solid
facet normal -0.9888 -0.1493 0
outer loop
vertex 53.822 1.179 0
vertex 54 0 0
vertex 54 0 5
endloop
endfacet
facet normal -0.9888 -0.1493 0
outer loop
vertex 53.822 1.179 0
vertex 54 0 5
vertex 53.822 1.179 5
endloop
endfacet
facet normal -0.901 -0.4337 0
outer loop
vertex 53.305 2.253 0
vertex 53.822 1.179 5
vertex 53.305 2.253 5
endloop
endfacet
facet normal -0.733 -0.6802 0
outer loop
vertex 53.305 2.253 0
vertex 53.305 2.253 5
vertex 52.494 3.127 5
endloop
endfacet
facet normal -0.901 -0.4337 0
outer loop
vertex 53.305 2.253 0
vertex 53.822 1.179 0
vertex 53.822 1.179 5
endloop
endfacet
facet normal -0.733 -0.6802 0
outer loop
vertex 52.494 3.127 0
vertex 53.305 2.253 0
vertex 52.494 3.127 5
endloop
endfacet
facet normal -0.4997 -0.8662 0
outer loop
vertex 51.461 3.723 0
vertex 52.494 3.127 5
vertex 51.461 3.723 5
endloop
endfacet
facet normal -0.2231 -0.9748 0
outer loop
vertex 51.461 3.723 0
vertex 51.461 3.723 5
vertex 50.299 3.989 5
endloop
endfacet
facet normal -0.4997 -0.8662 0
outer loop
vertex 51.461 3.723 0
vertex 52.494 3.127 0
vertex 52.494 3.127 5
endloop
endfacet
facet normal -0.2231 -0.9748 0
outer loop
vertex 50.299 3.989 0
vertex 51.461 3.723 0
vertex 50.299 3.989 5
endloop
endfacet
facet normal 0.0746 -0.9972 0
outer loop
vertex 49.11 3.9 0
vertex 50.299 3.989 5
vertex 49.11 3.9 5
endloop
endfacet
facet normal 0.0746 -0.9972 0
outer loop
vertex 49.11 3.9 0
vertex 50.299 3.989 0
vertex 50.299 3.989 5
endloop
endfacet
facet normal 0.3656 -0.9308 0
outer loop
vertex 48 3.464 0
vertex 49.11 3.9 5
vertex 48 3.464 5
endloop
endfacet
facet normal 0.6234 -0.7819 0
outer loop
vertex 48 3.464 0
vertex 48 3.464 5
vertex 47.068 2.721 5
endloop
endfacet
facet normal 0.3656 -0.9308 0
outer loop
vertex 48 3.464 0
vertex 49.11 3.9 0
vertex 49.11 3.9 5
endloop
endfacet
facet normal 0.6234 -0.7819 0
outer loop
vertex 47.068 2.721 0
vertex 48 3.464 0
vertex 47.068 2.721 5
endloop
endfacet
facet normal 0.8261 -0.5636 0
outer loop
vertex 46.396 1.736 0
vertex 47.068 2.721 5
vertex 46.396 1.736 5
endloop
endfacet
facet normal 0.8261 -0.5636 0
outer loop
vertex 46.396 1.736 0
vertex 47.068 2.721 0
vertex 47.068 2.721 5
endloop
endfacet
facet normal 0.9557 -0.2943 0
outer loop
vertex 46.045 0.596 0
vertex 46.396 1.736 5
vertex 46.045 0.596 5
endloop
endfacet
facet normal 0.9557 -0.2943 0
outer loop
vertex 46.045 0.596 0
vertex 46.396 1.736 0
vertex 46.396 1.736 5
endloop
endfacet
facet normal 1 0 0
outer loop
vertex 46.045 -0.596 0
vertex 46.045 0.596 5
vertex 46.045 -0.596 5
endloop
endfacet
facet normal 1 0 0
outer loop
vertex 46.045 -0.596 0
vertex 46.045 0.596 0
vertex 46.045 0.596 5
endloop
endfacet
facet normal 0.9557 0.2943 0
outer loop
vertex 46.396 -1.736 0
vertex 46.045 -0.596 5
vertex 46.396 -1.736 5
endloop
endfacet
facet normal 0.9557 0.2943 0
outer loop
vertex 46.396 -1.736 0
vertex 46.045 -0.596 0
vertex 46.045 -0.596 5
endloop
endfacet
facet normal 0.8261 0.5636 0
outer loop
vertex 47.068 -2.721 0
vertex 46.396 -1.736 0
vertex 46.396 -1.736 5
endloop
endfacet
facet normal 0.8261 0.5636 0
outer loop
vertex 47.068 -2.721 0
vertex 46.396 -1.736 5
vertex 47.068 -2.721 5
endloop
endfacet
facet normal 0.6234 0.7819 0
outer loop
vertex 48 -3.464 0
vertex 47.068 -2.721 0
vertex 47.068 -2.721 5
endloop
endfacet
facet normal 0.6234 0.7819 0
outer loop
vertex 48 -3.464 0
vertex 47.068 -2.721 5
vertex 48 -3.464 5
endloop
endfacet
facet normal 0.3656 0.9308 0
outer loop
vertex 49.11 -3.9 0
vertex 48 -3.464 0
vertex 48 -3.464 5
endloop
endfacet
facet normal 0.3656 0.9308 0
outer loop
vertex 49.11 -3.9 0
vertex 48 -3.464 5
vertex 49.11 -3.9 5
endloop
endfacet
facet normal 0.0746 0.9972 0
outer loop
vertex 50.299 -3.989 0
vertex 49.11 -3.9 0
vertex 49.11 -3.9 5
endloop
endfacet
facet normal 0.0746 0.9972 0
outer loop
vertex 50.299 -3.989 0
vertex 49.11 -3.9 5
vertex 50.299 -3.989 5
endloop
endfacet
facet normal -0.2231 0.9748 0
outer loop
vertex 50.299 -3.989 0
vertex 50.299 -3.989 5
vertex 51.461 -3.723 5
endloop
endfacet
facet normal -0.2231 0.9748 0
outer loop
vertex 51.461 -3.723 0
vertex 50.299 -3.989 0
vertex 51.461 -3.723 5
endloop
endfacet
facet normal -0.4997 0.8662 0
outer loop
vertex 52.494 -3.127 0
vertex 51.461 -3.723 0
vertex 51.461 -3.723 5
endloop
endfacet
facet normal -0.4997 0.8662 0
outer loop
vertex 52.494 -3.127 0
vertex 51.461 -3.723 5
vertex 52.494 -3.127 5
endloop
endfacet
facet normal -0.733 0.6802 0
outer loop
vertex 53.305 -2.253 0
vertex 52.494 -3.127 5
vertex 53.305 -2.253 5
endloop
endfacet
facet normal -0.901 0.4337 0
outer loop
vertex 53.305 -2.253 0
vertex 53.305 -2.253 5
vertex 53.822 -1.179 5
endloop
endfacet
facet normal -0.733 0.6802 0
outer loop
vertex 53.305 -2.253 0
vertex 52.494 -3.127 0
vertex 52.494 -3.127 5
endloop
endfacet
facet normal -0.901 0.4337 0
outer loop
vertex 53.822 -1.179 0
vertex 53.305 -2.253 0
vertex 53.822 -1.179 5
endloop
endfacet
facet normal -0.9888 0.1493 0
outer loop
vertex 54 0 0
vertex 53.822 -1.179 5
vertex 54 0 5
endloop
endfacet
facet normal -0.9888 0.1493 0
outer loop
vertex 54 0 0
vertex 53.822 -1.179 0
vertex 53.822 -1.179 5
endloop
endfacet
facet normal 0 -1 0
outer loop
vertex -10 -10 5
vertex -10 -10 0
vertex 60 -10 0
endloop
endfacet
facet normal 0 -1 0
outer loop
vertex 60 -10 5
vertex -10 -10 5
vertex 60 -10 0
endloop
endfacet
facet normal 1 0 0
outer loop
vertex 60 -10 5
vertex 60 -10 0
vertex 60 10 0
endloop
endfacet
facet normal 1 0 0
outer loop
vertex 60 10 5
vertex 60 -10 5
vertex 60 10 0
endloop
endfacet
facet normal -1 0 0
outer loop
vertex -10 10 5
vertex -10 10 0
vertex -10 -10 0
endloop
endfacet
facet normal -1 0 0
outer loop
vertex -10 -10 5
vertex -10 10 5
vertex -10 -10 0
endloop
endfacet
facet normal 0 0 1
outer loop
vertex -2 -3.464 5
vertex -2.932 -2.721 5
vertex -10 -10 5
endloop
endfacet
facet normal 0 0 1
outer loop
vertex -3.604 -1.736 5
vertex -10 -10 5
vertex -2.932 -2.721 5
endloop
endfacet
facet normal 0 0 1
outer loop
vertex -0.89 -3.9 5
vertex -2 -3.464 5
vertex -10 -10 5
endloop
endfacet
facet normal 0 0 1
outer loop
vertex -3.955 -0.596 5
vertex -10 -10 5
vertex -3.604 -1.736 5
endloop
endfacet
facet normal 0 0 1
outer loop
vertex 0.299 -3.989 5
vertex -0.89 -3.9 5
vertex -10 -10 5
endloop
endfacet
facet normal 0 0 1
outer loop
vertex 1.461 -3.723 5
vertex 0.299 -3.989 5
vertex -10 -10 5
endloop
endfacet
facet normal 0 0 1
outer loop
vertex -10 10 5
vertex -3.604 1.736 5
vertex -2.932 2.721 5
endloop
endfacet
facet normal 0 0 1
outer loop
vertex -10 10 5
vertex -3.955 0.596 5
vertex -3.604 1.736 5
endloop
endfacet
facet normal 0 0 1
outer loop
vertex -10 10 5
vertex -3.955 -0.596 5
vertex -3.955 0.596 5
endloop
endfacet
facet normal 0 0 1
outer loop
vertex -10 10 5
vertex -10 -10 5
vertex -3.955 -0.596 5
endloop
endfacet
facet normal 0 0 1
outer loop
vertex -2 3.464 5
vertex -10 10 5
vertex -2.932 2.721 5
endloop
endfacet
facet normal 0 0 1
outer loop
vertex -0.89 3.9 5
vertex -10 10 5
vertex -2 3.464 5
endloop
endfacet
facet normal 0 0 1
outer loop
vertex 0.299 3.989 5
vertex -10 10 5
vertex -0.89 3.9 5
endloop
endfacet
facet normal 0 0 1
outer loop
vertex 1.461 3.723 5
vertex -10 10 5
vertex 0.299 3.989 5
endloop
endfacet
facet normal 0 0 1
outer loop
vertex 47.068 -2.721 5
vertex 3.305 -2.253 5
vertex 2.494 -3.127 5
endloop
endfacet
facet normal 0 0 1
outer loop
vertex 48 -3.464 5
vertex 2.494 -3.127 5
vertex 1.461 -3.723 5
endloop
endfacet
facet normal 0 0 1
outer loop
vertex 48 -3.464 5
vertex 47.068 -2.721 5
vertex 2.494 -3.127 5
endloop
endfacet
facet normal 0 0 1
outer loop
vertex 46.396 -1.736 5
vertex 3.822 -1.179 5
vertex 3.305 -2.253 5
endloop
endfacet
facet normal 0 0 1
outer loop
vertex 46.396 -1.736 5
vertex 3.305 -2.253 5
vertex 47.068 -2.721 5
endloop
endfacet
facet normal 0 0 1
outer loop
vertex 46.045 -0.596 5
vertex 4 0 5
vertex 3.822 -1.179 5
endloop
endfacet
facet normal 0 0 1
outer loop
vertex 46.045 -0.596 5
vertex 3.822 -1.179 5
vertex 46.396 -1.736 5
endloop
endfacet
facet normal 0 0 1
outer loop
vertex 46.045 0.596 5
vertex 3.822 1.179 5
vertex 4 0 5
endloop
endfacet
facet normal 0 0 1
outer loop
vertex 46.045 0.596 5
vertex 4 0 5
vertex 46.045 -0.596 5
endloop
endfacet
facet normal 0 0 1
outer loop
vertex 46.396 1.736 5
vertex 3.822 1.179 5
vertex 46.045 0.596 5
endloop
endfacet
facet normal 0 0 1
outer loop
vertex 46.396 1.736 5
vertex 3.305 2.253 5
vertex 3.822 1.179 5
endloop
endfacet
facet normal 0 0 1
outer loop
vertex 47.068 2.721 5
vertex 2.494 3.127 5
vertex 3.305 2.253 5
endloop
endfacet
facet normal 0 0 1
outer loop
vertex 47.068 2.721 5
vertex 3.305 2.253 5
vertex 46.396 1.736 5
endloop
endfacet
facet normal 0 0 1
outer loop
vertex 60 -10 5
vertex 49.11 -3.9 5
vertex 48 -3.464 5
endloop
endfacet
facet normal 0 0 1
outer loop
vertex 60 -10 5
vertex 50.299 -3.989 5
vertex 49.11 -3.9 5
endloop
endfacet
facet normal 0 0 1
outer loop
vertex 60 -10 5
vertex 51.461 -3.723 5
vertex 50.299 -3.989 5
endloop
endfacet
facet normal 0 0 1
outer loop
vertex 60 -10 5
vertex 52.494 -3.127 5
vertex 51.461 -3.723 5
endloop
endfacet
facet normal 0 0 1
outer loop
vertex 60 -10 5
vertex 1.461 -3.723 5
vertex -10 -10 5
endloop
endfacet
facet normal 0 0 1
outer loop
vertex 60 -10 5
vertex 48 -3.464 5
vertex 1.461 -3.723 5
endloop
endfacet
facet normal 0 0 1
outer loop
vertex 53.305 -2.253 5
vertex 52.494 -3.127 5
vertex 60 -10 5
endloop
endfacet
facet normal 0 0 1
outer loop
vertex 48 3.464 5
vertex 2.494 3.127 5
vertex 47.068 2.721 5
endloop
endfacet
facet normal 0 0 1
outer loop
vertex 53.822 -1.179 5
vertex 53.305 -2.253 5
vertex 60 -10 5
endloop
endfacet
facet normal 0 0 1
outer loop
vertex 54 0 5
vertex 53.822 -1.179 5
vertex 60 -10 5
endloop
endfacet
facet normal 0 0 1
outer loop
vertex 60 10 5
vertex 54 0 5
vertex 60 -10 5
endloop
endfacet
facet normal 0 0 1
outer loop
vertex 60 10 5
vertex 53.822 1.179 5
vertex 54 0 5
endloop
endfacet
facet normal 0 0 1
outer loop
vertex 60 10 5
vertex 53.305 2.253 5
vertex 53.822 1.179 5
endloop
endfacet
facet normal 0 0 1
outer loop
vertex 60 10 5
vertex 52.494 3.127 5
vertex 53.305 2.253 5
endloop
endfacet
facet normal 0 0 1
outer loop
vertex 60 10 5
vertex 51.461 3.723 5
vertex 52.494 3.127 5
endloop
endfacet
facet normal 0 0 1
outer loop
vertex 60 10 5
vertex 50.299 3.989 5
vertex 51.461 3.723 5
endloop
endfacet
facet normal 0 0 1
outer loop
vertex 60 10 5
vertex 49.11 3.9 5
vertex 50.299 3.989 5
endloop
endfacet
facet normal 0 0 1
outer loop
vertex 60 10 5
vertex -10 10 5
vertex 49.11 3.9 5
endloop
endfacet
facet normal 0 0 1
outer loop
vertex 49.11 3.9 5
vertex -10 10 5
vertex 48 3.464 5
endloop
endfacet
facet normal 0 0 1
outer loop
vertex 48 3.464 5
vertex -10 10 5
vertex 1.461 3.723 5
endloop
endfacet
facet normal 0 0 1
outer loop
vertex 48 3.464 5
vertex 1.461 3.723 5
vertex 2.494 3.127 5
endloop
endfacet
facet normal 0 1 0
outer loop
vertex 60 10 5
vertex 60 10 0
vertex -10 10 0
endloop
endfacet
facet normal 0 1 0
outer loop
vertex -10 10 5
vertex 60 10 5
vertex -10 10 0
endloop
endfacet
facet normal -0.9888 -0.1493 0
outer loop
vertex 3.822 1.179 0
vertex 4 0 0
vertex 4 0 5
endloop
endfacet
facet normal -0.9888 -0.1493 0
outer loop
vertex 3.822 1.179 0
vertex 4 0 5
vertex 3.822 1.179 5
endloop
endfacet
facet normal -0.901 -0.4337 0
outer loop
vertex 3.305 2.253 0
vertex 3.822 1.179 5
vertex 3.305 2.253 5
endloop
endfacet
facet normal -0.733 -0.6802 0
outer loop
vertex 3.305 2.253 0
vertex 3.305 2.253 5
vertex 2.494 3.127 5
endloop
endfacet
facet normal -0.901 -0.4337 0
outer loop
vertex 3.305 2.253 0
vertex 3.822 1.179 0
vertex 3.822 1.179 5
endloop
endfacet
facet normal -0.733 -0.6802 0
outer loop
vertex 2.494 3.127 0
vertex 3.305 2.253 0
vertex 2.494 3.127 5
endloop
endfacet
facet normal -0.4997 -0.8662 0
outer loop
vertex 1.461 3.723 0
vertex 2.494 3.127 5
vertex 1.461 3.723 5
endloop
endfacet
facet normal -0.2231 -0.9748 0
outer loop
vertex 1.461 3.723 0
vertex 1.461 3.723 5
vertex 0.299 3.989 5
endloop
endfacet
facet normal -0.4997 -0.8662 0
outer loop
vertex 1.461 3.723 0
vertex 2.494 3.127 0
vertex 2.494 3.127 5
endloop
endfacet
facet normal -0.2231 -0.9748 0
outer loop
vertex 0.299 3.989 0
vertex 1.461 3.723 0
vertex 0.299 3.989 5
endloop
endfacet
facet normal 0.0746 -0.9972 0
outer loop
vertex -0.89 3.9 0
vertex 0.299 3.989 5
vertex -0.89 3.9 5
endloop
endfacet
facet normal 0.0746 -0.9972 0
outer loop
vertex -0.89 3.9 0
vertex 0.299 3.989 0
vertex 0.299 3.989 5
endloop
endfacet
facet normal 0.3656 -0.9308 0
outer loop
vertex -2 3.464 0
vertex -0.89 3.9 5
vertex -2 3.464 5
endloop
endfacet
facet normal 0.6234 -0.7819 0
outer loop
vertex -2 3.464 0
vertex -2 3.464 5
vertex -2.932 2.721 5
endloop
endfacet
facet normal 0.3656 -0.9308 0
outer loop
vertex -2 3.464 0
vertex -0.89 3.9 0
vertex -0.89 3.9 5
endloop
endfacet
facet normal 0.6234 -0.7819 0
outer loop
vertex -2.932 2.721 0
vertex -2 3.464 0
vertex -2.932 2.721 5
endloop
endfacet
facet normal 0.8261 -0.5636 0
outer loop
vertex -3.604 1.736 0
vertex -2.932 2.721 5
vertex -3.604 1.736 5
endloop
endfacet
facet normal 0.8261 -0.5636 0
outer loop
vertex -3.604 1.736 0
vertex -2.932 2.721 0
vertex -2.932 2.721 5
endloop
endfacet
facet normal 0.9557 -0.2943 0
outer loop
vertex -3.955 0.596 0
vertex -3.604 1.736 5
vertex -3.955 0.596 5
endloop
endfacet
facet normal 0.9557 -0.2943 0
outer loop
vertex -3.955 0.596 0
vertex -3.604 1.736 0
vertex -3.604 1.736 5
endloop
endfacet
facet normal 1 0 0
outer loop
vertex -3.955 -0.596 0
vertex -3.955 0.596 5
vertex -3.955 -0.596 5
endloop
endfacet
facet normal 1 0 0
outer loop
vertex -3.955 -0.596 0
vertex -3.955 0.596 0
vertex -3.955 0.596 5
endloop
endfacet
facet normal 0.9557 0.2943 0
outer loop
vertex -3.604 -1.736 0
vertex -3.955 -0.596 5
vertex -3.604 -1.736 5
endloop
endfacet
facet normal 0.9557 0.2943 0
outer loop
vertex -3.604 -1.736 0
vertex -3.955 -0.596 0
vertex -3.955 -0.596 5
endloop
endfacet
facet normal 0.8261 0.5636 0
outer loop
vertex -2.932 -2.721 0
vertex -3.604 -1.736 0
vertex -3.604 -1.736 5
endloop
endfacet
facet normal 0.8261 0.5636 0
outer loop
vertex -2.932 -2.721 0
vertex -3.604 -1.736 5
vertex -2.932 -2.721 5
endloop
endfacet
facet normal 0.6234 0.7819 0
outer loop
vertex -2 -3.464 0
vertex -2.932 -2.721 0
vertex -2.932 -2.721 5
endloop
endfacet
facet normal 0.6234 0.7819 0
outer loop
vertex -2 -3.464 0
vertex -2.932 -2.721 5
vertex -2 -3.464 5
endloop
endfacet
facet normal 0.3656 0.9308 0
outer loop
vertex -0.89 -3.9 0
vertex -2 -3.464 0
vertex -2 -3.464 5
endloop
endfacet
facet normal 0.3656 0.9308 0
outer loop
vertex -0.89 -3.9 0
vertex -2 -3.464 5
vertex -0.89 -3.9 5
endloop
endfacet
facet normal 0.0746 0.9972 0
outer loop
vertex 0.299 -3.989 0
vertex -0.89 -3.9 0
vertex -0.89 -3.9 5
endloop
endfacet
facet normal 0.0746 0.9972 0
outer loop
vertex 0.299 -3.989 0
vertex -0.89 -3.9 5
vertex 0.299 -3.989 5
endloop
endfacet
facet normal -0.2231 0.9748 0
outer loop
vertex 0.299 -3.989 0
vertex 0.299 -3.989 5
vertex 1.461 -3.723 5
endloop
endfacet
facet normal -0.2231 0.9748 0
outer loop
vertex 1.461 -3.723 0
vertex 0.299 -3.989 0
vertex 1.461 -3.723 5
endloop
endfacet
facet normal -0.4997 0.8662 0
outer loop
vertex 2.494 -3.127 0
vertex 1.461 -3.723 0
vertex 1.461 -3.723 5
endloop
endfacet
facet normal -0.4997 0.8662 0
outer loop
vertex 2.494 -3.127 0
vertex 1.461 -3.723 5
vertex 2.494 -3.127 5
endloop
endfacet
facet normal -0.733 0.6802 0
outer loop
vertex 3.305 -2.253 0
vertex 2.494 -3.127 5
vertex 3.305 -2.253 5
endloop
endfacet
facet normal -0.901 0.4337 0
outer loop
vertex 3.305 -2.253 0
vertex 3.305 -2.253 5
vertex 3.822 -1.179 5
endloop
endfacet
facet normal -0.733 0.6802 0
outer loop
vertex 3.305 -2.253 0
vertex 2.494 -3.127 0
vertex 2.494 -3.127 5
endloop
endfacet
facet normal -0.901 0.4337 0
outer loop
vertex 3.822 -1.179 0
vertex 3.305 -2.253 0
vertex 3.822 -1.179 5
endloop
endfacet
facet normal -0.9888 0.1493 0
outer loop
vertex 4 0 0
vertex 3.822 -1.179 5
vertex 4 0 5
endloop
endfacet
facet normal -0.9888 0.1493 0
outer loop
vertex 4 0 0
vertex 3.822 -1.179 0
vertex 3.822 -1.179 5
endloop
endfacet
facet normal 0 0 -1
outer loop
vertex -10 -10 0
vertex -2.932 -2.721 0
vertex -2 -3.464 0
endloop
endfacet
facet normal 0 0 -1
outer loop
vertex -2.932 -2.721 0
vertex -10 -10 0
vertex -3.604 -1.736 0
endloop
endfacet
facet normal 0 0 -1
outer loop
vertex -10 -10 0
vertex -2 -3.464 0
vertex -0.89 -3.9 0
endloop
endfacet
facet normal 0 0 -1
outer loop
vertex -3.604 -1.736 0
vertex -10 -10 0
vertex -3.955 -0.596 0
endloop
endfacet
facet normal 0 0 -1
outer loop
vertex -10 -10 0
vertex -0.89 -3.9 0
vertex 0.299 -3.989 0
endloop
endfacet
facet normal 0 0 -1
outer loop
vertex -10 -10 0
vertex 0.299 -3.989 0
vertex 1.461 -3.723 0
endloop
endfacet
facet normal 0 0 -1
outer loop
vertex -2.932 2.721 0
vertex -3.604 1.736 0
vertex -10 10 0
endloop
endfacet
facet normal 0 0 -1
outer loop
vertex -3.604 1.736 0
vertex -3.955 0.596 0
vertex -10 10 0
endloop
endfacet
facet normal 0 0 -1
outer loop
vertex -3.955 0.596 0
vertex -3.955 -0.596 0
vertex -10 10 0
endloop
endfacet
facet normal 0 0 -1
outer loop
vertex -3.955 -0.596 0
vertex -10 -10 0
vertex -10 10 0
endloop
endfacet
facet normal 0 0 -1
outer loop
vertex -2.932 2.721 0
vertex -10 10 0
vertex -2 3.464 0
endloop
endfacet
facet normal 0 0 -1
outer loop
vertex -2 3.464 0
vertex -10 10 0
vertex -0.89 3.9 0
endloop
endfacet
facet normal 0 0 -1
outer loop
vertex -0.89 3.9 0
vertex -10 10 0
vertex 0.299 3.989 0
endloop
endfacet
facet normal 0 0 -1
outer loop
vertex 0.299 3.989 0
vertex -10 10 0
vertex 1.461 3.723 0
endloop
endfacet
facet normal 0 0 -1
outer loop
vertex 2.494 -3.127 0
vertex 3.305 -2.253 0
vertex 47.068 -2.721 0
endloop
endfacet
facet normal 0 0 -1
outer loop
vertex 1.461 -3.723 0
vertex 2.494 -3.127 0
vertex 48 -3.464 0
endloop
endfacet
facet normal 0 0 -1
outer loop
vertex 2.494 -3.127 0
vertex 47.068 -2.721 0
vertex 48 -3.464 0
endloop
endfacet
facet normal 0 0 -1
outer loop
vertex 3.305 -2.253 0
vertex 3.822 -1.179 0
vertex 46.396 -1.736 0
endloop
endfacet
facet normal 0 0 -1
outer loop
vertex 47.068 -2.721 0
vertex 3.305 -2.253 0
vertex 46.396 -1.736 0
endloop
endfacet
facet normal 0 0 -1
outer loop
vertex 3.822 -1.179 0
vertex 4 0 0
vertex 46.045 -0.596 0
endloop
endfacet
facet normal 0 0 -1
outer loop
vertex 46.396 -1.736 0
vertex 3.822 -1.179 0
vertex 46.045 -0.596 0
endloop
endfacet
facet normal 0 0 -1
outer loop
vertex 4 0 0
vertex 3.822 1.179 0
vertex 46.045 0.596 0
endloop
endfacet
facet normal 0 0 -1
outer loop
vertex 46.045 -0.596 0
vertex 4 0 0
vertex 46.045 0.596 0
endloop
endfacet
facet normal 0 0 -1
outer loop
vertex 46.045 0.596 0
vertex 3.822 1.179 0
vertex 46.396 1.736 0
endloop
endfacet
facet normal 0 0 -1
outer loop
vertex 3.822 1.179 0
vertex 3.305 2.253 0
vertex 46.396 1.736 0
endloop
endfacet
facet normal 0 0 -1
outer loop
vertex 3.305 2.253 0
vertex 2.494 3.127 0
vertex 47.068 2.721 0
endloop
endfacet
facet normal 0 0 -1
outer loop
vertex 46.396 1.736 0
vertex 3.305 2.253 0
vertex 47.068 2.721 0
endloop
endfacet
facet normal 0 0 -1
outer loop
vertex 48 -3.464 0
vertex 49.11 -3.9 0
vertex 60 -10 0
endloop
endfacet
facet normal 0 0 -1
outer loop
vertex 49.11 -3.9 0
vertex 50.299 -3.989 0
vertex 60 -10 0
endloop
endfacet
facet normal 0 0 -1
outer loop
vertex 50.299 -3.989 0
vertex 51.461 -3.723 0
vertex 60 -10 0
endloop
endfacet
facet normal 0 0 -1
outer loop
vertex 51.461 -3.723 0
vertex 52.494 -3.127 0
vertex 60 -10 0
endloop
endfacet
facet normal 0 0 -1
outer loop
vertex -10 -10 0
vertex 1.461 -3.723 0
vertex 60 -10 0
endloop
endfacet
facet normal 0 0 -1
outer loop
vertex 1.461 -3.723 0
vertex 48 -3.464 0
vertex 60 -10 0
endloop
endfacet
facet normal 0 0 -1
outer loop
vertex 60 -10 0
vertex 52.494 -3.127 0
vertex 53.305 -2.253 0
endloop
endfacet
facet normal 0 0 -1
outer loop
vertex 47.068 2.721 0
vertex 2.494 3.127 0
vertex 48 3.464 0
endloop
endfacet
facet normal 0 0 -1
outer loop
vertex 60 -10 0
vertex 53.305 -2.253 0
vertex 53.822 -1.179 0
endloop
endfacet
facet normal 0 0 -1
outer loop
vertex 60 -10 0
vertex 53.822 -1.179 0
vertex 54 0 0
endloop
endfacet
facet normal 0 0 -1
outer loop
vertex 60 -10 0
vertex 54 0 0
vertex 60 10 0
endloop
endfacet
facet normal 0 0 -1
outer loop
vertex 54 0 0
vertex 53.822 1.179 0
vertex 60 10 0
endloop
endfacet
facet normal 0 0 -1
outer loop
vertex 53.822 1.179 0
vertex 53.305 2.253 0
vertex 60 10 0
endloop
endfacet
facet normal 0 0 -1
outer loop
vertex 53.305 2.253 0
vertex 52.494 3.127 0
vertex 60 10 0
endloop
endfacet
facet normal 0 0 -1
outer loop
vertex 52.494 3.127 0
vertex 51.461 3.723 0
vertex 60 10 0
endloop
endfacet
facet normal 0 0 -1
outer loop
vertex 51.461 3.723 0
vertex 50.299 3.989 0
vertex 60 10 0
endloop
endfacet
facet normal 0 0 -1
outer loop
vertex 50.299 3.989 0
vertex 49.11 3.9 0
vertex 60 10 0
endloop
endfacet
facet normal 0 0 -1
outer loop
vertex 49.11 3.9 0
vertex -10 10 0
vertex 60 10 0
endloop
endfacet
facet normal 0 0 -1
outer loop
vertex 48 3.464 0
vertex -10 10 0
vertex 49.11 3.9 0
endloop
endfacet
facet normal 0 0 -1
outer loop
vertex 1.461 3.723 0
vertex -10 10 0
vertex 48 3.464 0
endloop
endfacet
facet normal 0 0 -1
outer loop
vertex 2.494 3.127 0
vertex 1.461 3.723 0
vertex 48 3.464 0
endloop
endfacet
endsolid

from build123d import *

# Parameters (mm, degrees)
SKETCH_1_R      = 4
EXTRUDE_1_DEPTH = 5


with BuildPart() as part:
    # 草图1 → 凸台-拉伸1 (new body)
    with BuildSketch(Plane.XY):
        Polygon((10, -10), (40, -10), (60, -10), (60, 10), (40, 10), (10, 10), (-10, 10), (-10, -10), align=None)
        Circle(SKETCH_1_R, mode=Mode.SUBTRACT)
        with Locations((50, 0)):
            Circle(SKETCH_1_R, mode=Mode.SUBTRACT)
    extrude(amount=EXTRUDE_1_DEPTH)


solid = part.part
